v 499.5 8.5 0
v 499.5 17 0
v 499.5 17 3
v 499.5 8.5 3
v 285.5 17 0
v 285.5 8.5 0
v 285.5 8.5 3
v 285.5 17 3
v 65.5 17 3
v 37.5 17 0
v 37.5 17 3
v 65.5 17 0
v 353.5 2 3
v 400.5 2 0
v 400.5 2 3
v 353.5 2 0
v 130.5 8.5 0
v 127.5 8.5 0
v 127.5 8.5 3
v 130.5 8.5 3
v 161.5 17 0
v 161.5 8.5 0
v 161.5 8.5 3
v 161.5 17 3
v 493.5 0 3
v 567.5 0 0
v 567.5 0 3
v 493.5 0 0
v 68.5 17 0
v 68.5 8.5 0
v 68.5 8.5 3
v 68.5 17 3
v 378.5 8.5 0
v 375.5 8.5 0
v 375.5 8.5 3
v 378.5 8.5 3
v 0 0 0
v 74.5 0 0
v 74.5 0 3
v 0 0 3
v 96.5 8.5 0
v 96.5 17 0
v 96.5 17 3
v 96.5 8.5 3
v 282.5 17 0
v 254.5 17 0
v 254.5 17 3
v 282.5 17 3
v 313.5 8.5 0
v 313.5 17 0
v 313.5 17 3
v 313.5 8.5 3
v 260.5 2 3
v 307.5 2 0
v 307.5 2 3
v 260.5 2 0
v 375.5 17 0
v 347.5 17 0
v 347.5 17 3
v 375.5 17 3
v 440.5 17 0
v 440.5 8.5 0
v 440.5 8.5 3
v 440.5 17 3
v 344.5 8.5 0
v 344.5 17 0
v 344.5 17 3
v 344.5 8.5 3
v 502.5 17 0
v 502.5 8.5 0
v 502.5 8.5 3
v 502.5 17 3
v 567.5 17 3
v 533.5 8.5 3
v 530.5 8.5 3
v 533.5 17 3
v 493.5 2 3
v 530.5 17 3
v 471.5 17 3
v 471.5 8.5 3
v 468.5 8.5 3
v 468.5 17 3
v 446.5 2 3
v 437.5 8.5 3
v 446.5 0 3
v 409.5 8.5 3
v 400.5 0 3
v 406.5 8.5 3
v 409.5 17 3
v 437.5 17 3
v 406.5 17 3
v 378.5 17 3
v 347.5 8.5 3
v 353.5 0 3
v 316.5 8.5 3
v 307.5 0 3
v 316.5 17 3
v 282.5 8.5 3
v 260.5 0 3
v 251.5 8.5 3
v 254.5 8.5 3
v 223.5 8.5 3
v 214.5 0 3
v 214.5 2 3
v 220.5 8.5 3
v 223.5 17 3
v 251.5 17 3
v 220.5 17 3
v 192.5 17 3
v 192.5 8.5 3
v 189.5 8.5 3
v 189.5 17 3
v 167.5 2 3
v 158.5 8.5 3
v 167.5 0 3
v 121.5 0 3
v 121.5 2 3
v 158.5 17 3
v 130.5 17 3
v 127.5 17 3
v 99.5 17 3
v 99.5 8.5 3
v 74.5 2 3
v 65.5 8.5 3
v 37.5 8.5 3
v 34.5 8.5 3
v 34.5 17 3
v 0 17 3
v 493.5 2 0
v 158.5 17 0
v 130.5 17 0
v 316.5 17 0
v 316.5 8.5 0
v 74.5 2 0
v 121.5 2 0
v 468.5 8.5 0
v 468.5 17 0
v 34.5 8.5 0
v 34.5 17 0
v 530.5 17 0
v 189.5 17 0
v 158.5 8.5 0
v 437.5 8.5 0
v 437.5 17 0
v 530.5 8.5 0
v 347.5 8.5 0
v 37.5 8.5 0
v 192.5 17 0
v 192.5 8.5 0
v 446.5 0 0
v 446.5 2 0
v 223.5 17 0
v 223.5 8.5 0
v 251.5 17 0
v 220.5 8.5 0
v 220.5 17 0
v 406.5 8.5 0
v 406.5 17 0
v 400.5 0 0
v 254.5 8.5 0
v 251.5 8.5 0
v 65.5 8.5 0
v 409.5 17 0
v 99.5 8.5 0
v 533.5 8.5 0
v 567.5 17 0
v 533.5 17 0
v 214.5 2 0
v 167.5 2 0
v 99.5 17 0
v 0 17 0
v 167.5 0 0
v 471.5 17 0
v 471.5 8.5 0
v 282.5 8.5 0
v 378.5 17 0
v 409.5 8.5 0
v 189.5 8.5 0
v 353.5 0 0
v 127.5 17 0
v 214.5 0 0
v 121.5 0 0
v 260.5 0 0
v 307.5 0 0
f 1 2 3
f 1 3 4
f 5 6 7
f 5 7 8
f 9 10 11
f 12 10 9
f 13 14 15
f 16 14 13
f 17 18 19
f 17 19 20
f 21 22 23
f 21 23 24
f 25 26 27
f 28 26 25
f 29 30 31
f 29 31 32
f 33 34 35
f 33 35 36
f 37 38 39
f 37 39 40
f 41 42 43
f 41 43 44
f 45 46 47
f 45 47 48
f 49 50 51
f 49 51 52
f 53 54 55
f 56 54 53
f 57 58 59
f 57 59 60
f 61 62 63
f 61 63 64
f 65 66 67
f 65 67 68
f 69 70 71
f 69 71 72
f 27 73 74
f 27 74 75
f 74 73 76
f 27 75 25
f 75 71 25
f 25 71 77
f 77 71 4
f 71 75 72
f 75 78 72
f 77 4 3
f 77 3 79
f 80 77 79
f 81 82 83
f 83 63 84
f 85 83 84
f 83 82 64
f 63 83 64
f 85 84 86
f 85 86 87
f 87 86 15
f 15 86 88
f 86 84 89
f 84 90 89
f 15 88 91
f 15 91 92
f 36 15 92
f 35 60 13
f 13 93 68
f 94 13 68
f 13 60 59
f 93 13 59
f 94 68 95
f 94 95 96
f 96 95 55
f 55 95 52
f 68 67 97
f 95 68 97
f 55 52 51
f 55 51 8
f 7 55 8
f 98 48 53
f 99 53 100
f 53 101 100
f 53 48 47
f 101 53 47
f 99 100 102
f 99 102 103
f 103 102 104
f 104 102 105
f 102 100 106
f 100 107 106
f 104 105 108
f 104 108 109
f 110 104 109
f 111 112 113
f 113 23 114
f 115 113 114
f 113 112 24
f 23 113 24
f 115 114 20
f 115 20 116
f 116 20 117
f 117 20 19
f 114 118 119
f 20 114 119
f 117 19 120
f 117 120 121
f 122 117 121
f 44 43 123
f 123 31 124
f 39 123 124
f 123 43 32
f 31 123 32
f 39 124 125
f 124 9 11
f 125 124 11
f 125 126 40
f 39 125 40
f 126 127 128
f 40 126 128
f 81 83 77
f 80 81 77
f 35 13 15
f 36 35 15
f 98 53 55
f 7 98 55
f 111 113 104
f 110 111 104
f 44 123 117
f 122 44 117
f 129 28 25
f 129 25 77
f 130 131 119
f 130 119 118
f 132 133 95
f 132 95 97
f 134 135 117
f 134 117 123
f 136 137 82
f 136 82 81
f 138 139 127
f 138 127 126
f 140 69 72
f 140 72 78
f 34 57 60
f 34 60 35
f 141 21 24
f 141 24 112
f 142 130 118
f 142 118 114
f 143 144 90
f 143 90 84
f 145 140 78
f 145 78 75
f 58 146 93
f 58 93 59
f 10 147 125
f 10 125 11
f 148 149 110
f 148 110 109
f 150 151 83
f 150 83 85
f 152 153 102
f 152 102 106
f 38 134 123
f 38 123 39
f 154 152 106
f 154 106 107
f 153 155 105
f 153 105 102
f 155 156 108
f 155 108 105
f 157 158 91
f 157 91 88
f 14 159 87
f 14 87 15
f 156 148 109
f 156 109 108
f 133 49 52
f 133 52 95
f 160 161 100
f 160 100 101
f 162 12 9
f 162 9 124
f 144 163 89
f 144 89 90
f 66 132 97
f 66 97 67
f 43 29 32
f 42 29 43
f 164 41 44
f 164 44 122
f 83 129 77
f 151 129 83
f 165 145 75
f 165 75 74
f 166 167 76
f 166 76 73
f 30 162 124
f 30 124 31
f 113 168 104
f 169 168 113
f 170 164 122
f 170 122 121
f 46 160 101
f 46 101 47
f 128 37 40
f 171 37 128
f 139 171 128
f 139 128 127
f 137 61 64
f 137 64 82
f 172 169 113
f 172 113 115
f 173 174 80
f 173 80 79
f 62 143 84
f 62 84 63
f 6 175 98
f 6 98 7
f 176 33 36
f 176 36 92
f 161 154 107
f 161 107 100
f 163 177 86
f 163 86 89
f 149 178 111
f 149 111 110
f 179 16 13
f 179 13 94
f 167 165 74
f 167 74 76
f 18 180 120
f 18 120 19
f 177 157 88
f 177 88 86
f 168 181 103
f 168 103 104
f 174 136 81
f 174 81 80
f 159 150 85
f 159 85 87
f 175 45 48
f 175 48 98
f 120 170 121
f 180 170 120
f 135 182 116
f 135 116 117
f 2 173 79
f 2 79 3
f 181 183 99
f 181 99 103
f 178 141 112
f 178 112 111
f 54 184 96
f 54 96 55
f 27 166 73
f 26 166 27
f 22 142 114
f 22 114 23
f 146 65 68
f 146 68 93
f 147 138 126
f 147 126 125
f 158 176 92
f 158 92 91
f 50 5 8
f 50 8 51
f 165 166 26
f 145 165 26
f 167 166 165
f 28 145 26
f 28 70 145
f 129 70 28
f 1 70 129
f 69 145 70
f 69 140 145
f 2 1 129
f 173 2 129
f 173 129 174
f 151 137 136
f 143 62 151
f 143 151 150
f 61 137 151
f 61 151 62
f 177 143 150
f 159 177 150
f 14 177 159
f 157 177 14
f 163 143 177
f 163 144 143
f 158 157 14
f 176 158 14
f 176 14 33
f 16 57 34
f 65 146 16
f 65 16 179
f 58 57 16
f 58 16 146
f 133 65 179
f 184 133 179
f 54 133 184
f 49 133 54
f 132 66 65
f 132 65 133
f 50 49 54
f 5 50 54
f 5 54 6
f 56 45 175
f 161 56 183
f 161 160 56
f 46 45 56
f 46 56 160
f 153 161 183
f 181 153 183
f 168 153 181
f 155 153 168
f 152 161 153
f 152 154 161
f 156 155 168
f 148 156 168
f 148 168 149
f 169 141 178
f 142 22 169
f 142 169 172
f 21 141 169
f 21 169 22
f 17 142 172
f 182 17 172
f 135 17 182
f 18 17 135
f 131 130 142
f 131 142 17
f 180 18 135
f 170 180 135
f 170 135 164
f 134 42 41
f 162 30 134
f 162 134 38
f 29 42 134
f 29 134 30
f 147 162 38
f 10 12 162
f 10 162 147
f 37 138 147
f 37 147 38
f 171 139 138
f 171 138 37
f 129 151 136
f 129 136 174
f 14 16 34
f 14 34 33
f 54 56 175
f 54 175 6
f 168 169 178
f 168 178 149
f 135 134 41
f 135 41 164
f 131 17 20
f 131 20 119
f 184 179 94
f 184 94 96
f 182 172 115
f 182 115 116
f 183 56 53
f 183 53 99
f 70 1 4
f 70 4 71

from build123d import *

# Parameters (mm, degrees)
PAD_DEPTH = 3


with BuildPart() as part:
    # Sketch → Pad (new body)
    with BuildSketch(Plane.XY):
        Polygon((0, 0), (0, 17), (34.5, 17), (34.5, 8.5), (37.5, 8.5), (37.5, 17), (65.5, 17), (65.5, 8.5), (68.5, 8.5), (68.5, 17), (96.5, 17), (96.5, 8.5), (99.5, 8.5), (99.5, 17), (127.5, 17), (127.5, 8.5), (130.5, 8.5), (130.5, 17), (158.5, 17), (158.5, 8.5), (161.5, 8.5), (161.5, 17), (189.5, 17), (189.5, 8.5), (192.5, 8.5), (192.5, 17), (220.5, 17), (220.5, 8.5), (223.5, 8.5), (223.5, 17), (251.5, 17), (251.5, 8.5), (254.5, 8.5), (254.5, 17), (282.5, 17), (282.5, 8.5), (285.5, 8.5), (285.5, 17), (313.5, 17), (313.5, 8.5), (316.5, 8.5), (316.5, 17), (344.5, 17), (344.5, 8.5), (347.5, 8.5), (347.5, 17), (375.5, 17), (375.5, 8.5), (378.5, 8.5), (378.5, 17), (406.5, 17), (406.5, 8.5), (409.5, 8.5), (409.5, 17), (437.5, 17), (437.5, 8.5), (440.5, 8.5), (440.5, 17), (468.5, 17), (468.5, 8.5), (471.5, 8.5), (471.5, 17), (499.5, 17), (499.5, 8.5), (502.5, 8.5), (502.5, 17), (530.5, 17), (530.5, 8.5), (533.5, 8.5), (533.5, 17), (567.5, 17), (567.5, 0), (493.5, 0), (493.5, 2), (446.5, 2), (446.5, 0), (400.5, 0), (400.5, 2), (353.5, 2), (353.5, 0), (307.5, 0), (307.5, 2), (260.5, 2), (260.5, 0), (214.5, 0), (214.5, 2), (167.5, 2), (167.5, 0), (121.5, 0), (121.5, 2), (74.5, 2), (74.5, 0), align=None)
    extrude(amount=PAD_DEPTH)


solid = part.part
